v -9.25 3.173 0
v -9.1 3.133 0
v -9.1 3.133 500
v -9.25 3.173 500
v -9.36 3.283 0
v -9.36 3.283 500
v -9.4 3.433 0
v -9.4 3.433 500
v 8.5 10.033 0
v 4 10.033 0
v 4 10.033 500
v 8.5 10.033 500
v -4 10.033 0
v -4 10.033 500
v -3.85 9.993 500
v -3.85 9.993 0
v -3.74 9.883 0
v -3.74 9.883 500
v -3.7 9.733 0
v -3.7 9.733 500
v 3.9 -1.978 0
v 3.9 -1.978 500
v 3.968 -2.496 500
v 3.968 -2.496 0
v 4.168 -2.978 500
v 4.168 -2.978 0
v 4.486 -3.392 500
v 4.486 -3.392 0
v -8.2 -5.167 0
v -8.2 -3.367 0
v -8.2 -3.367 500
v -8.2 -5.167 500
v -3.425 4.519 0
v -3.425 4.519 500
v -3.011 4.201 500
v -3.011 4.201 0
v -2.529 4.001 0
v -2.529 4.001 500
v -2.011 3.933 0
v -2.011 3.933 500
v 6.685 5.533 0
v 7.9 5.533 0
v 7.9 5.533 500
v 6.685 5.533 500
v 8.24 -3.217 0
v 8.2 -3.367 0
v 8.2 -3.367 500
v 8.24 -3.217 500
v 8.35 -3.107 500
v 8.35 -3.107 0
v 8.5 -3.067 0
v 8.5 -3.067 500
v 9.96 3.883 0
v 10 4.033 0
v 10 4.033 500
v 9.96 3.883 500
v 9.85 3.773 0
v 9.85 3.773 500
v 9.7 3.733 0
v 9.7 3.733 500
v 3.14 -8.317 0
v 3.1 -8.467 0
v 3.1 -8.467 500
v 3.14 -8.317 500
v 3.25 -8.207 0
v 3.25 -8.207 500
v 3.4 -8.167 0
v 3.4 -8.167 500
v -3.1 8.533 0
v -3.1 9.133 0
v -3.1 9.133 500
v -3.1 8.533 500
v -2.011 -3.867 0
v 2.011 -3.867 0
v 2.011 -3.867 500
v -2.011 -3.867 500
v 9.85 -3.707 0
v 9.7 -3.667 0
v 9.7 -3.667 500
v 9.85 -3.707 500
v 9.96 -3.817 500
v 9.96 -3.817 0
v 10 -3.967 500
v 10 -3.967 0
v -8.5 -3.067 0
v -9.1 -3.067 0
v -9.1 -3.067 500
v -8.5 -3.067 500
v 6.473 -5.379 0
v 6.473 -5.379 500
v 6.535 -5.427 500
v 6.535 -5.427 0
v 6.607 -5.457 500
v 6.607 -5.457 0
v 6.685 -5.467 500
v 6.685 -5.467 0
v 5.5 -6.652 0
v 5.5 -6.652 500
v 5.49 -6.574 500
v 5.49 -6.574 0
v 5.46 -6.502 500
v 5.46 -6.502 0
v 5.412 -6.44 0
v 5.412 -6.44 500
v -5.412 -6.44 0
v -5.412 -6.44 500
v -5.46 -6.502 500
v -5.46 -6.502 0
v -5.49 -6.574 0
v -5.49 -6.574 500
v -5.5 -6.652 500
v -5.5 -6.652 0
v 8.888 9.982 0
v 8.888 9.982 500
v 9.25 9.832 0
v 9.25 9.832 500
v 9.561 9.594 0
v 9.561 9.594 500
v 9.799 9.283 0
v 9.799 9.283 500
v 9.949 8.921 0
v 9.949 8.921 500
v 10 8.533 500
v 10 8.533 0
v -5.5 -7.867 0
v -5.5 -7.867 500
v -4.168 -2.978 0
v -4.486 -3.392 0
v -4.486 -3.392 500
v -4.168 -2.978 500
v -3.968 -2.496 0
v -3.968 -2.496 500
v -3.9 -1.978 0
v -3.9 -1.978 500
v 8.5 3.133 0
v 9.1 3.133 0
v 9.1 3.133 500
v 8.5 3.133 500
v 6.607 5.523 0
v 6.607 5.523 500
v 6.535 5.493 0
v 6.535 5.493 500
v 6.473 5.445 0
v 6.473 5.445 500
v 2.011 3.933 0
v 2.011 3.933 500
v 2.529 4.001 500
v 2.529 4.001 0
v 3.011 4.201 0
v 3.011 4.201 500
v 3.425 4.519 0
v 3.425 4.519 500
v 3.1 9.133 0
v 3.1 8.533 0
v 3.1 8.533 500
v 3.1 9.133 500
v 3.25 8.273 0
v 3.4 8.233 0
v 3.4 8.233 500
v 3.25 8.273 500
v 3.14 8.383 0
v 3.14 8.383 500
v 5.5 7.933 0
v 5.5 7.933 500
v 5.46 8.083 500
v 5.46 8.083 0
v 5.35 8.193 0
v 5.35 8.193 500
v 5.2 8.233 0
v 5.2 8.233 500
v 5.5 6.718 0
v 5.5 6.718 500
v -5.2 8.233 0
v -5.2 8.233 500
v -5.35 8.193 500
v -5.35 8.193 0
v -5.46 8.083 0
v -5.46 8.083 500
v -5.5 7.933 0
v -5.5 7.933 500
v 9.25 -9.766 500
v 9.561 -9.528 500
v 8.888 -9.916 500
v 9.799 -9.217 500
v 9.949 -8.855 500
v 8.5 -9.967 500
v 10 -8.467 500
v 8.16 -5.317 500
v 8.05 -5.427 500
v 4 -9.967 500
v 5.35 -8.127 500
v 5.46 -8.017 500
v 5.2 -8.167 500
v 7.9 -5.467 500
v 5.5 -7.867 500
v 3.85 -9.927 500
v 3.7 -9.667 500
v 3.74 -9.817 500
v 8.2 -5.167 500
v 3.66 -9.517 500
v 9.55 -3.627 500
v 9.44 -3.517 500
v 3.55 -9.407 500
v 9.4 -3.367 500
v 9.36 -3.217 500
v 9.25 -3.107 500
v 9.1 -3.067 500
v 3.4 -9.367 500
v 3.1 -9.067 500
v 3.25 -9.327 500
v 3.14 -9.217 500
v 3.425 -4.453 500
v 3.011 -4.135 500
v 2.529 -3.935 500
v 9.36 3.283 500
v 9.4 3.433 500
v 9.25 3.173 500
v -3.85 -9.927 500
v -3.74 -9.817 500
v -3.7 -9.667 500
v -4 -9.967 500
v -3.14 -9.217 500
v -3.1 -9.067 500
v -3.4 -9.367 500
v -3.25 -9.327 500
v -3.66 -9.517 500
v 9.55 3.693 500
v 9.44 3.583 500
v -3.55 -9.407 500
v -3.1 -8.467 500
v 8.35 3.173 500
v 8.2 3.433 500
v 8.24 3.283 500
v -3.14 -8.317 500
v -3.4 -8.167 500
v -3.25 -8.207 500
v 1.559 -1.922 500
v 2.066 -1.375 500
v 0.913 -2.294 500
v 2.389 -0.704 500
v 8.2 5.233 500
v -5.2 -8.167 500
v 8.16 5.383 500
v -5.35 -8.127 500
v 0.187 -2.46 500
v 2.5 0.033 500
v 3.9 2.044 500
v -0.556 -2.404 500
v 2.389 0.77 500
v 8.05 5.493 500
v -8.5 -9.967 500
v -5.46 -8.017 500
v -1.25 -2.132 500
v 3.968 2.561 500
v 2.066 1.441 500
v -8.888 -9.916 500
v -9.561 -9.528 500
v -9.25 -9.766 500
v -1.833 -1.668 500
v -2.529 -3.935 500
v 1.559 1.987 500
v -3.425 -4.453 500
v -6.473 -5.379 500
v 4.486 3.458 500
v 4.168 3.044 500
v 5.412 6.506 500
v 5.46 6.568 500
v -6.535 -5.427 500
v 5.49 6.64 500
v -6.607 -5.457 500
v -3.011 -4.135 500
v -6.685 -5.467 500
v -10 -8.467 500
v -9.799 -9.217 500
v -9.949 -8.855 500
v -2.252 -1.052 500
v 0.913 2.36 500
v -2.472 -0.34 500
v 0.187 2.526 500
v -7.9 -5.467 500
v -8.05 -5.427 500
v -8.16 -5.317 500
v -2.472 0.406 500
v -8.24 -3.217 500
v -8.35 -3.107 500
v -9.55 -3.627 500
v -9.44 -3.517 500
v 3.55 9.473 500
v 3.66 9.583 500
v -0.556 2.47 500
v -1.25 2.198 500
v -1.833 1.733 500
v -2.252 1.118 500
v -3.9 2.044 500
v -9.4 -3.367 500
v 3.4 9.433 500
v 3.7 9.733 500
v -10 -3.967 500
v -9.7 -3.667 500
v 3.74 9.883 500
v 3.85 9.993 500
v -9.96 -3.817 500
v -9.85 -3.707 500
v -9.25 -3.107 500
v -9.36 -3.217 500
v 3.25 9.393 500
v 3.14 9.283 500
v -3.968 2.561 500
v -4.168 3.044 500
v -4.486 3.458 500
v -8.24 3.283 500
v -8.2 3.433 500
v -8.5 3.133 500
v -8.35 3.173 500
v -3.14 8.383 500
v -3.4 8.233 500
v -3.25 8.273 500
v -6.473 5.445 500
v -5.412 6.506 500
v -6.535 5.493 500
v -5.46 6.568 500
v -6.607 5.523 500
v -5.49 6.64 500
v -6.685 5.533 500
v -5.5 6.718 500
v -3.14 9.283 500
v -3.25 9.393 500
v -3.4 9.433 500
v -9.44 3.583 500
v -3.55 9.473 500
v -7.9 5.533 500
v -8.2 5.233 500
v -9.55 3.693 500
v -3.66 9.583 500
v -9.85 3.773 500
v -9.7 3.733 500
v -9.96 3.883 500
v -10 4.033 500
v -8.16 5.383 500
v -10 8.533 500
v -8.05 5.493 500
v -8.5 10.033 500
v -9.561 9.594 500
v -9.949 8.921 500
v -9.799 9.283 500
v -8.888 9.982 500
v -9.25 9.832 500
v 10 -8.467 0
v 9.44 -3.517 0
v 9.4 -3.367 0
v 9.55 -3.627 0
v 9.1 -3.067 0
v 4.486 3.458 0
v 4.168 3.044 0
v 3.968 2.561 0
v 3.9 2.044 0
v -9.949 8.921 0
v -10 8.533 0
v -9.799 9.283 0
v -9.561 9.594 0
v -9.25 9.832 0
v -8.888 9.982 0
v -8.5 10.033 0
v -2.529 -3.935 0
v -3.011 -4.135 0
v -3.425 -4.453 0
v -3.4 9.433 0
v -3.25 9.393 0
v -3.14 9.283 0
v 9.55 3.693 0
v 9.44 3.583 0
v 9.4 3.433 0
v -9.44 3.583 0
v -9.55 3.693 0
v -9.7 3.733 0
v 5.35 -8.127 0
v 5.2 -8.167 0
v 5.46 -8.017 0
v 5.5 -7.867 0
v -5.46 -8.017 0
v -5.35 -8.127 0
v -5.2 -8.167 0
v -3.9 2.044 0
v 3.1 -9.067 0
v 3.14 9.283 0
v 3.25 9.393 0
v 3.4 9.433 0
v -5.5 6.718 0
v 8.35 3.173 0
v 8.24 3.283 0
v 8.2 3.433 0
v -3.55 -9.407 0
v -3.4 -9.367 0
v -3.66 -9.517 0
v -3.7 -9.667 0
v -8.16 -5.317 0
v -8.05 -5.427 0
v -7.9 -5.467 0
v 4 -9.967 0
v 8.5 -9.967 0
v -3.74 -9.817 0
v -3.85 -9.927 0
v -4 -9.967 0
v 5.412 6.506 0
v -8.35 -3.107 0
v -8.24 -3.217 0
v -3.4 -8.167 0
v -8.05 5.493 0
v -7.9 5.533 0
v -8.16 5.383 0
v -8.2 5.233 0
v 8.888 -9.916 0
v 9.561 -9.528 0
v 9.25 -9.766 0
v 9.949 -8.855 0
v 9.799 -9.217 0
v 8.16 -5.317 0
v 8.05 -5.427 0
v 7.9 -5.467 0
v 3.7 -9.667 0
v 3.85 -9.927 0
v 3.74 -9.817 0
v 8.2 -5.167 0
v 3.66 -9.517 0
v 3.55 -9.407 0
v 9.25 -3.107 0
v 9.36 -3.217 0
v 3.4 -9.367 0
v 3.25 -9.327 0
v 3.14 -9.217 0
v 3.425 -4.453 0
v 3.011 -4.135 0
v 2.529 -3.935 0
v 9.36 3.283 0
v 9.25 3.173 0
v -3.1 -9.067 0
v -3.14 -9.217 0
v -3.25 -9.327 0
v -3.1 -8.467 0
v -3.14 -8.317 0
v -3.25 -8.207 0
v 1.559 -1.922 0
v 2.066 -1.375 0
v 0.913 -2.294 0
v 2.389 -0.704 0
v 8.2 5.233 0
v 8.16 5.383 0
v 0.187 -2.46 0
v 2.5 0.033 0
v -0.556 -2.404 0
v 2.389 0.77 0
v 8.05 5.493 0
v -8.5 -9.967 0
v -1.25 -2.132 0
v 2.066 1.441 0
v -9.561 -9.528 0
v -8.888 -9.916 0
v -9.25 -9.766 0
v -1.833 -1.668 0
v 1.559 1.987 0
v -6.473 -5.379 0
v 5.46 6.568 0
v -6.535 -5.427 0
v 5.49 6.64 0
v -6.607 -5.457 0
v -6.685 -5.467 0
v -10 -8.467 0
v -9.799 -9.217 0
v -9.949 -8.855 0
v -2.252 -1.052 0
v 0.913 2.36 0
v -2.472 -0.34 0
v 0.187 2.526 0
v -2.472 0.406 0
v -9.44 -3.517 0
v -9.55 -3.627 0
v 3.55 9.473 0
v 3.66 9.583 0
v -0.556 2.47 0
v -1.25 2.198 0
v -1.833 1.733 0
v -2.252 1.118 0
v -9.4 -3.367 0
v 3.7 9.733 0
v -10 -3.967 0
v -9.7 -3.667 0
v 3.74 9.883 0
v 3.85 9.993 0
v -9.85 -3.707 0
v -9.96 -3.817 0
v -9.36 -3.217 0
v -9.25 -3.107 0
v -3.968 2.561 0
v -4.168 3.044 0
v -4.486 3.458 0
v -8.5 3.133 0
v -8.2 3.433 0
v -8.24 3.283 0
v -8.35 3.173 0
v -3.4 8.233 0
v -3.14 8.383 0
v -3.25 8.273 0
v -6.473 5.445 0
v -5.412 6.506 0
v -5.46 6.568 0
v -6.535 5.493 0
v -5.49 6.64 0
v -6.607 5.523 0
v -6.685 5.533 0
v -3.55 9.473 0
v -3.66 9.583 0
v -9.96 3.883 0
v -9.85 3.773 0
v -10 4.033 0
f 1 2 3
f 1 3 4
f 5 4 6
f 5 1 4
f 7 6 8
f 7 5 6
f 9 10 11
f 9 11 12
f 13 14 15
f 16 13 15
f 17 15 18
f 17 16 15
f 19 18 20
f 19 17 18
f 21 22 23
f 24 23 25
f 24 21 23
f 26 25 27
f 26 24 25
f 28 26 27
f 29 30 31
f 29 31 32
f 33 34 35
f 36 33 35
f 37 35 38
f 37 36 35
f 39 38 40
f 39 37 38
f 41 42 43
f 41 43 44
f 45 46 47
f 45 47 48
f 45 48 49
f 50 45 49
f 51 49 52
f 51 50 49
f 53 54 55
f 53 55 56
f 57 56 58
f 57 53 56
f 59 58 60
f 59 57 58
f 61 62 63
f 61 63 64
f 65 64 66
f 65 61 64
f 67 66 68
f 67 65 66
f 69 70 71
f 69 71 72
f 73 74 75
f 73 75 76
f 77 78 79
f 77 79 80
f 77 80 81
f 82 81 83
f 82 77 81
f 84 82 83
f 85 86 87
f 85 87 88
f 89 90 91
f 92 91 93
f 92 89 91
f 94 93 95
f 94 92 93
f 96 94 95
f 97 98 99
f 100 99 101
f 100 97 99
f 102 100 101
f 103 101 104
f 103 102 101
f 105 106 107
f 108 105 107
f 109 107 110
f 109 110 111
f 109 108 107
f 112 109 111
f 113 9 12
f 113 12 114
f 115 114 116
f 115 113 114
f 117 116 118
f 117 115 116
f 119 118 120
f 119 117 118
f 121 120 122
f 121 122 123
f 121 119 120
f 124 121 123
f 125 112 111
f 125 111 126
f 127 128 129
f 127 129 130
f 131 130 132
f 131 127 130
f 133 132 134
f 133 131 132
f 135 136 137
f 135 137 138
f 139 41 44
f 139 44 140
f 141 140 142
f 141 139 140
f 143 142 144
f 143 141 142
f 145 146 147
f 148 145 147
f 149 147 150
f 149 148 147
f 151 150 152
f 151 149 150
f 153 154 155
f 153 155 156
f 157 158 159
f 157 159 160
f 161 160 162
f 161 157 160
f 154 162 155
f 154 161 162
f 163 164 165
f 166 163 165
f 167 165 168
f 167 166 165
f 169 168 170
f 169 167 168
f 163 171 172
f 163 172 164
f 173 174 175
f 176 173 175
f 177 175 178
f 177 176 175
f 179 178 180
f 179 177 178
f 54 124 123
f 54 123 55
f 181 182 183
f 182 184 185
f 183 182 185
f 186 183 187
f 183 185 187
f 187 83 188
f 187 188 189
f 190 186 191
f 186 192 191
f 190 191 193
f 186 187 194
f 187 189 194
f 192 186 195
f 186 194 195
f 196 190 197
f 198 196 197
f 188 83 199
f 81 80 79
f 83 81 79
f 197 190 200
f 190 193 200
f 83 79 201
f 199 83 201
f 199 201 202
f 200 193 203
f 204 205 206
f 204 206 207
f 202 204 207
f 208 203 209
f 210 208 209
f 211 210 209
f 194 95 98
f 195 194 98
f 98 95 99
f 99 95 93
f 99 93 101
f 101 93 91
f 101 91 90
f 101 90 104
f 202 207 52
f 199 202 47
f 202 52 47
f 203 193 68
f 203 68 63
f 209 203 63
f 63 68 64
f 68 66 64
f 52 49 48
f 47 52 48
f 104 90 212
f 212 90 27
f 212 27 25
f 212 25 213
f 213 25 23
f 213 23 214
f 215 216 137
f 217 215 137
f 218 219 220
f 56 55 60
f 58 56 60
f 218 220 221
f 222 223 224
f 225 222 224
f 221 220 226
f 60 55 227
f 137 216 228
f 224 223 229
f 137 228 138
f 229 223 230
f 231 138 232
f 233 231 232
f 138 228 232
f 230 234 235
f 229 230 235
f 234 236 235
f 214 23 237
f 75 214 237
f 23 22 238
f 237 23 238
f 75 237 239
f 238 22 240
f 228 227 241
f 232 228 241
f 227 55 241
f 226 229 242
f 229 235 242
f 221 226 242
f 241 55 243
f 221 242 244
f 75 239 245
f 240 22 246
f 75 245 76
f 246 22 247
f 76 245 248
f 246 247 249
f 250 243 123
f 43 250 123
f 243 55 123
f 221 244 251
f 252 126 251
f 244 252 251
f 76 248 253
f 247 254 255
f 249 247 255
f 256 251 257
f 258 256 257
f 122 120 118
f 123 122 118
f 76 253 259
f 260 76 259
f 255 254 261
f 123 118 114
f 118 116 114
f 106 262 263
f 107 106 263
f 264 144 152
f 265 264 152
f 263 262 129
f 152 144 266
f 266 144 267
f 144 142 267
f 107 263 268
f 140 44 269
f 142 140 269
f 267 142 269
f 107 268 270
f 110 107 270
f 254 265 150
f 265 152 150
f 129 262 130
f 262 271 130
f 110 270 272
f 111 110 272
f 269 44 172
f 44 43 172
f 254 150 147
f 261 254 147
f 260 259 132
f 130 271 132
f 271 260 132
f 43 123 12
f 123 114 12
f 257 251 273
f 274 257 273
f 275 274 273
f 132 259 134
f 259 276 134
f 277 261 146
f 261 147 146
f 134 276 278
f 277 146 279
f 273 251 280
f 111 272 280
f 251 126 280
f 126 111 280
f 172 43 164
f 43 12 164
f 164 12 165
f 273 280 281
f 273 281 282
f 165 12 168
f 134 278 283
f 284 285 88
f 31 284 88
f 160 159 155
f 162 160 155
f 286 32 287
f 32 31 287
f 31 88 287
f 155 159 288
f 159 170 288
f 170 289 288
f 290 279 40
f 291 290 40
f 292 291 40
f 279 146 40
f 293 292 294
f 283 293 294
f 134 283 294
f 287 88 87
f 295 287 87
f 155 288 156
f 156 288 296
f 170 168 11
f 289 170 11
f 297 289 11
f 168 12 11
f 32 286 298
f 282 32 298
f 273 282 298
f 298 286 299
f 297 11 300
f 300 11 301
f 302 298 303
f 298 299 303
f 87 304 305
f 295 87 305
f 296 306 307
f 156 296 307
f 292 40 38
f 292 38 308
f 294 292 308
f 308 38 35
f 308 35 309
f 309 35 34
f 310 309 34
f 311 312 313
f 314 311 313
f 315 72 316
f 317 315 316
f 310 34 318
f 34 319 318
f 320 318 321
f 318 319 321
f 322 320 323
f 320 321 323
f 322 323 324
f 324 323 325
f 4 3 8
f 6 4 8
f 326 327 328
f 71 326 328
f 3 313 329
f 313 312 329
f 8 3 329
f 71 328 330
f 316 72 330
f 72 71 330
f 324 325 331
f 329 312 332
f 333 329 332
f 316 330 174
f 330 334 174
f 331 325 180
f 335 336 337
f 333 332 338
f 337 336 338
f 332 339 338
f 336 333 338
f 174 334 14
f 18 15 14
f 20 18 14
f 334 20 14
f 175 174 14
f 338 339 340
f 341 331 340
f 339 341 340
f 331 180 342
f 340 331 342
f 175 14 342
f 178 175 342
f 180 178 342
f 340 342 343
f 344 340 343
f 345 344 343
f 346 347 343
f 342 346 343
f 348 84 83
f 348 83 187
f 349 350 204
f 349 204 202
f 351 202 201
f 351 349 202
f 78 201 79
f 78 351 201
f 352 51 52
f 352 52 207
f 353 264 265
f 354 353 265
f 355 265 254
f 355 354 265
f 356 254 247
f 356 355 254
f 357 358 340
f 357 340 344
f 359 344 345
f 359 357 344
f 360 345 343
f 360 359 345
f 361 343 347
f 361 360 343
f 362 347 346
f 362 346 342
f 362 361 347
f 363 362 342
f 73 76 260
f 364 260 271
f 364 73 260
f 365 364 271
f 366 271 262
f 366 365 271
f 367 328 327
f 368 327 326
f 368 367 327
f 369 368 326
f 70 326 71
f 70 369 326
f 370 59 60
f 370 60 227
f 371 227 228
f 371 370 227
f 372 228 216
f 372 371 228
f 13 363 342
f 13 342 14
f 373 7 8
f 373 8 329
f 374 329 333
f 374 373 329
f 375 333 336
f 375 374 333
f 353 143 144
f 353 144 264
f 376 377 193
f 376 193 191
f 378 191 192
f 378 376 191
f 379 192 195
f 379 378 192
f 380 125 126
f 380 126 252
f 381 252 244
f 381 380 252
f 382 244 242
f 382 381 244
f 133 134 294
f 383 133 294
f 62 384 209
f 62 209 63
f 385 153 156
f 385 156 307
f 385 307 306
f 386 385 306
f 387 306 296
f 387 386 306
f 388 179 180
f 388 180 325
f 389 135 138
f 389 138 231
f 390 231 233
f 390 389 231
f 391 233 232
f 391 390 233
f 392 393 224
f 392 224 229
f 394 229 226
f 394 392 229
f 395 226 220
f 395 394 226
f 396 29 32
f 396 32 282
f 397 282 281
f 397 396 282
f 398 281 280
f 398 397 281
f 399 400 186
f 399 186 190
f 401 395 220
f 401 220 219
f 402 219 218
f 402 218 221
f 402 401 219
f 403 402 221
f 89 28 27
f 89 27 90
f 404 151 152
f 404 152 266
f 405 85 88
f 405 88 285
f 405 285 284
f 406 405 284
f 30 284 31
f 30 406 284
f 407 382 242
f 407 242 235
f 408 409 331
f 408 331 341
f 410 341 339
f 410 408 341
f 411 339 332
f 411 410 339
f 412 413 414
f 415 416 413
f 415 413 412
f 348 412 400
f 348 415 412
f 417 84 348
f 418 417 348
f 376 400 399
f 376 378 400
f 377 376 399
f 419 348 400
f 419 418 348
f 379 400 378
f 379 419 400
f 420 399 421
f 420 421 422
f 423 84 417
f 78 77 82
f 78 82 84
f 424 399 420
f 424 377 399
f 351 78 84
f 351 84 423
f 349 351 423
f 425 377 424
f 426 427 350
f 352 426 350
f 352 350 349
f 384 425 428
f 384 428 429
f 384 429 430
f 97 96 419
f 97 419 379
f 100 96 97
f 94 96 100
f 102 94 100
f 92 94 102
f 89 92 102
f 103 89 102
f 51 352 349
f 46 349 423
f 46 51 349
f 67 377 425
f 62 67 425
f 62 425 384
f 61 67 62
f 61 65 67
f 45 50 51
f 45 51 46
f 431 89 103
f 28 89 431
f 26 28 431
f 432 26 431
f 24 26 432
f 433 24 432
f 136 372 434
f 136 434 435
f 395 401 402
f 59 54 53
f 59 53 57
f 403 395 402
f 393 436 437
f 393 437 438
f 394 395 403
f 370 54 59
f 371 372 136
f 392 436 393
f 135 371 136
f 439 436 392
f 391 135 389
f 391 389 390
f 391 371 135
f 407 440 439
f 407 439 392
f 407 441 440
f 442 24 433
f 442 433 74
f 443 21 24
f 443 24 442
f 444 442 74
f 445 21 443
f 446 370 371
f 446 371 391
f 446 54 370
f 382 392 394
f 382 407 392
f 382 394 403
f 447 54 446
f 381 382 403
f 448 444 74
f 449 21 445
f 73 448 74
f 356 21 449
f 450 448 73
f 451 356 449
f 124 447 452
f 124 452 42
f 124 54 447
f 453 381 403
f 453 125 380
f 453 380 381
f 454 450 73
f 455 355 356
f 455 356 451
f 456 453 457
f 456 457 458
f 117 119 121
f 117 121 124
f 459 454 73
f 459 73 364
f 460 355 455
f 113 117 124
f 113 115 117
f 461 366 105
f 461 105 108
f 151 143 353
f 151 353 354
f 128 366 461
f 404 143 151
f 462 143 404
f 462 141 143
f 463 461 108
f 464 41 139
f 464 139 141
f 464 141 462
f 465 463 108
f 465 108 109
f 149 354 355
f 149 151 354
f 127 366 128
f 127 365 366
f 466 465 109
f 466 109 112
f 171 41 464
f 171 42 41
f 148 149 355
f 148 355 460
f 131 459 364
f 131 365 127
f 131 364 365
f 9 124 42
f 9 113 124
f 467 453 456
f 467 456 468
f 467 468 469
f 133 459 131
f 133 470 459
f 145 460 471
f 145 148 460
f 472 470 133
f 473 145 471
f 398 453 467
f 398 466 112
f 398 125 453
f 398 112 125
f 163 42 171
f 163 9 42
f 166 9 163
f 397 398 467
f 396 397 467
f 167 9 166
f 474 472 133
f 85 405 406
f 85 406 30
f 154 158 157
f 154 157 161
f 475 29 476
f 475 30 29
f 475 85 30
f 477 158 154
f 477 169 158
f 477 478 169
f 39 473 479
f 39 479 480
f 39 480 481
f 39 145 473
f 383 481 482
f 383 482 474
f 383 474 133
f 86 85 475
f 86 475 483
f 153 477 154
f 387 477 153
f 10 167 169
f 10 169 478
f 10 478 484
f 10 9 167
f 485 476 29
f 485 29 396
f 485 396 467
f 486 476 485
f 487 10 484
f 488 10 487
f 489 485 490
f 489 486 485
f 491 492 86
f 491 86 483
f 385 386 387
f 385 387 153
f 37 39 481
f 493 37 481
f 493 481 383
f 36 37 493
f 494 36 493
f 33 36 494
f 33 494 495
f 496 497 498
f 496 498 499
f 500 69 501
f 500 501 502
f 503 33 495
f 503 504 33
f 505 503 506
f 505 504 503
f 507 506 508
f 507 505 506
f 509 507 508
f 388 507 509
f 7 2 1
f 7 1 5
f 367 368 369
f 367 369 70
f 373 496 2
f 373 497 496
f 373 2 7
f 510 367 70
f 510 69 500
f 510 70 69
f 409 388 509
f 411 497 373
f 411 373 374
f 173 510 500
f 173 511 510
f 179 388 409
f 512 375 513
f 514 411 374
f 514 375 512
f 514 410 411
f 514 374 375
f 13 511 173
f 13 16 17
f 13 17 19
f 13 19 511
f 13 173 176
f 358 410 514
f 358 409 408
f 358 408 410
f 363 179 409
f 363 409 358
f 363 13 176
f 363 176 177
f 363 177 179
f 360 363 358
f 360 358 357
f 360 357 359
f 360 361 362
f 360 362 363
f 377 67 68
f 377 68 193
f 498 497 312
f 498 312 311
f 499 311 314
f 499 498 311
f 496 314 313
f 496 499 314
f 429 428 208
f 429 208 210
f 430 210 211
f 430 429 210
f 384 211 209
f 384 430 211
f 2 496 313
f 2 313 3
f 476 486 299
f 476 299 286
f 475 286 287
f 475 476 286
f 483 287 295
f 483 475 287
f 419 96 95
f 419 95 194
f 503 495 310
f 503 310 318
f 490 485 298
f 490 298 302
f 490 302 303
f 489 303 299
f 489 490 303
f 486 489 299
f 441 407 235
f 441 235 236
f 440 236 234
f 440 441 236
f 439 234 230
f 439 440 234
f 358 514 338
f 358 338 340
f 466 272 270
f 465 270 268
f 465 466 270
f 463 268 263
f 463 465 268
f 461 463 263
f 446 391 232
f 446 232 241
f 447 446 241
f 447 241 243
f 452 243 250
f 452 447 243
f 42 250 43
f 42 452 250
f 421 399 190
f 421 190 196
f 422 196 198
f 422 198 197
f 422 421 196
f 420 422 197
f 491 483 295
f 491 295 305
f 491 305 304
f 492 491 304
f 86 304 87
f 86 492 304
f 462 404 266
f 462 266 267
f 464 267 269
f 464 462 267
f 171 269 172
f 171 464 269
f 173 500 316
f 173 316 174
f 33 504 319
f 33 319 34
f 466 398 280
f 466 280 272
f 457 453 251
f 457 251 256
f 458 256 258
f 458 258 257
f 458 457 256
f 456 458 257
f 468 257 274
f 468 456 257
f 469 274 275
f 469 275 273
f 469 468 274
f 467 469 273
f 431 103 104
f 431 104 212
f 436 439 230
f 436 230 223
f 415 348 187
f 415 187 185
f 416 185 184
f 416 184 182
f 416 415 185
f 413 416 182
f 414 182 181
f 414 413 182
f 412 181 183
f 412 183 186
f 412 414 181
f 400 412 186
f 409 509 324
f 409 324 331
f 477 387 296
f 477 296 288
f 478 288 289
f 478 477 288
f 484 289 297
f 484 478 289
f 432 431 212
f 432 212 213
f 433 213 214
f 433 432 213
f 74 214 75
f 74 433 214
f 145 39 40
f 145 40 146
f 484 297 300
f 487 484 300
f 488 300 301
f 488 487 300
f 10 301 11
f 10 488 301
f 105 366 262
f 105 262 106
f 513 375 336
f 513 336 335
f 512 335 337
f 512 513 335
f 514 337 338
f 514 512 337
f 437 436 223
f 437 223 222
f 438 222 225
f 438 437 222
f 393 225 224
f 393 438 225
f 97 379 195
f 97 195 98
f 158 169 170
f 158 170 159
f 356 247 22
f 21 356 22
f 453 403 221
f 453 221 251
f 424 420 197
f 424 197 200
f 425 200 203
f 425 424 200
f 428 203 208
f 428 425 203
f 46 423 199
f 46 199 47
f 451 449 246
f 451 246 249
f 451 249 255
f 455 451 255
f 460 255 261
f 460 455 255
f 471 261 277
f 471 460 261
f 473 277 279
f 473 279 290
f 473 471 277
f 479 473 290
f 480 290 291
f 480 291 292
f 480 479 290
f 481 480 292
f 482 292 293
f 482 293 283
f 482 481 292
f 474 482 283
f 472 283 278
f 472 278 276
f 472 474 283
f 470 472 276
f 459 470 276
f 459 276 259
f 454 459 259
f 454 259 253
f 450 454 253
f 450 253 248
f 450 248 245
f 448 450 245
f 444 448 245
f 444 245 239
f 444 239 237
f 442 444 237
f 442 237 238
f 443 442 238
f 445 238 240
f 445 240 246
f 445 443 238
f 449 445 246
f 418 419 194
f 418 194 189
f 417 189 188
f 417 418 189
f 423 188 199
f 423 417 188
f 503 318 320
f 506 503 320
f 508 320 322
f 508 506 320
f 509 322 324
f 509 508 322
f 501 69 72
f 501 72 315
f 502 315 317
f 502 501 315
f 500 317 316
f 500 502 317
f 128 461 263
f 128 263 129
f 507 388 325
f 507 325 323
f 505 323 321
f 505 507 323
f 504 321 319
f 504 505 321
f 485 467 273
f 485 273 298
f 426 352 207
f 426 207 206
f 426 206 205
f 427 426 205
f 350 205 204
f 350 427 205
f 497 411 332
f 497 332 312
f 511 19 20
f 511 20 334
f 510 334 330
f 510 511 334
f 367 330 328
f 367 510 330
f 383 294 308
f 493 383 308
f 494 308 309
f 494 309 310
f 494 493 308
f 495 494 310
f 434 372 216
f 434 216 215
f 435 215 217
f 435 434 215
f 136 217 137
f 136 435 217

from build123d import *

# Parameters (mm, degrees)
SKETCH_1_R      = 2.5
EXTRUDE_1_DEPTH = 500


with BuildPart() as part:
    # 草图1 → 凸台-拉伸1 (new body)
    with BuildSketch(Plane.XY):
        with BuildLine():
            Line((10, 8.532915167), (10, 4.032915167))
            ThreePointArc((10, 4.032915167), (9.912132034, 3.820783133), (9.7, 3.732915167))
            ThreePointArc((9.7, 3.732915167), (9.487867966, 3.645047202), (9.4, 3.432915167))
            ThreePointArc((9.4, 3.432915167), (9.312132034, 3.220783133), (9.1, 3.132915167))
            Line((9.1, 3.132915167), (8.5, 3.132915167))
            ThreePointArc((8.5, 3.132915167), (8.287867966, 3.220783133), (8.2, 3.432915167))
            Line((8.2, 3.432915167), (8.2, 5.232915167))
            ThreePointArc((8.2, 5.232915167), (8.112132034, 5.445047202), (7.9, 5.532915167))
            Line((7.9, 5.532915167), (6.68492424, 5.532915167))
            ThreePointArc((6.68492424, 5.532915167), (6.570119211, 5.510079027), (6.472792206, 5.445047202))
            Line((6.472792206, 5.445047202), (4.485786438, 3.458041433))
            ThreePointArc((4.485786438, 3.458041433), (4.052240935, 2.809194736), (3.9, 2.043827871))
            Line((3.9, 2.043827871), (3.9, -1.977997536))
            ThreePointArc((3.9, -1.977997536), (4.052240935, -2.743364401), (4.485786438, -3.392211098))
            Line((4.485786438, -3.392211098), (6.472792206, -5.379216867))
            ThreePointArc((6.472792206, -5.379216867), (6.570119211, -5.444248692), (6.68492424, -5.467084833))
            Line((6.68492424, -5.467084833), (7.9, -5.467084833))
            ThreePointArc((7.9, -5.467084833), (8.112132034, -5.379216867), (8.2, -5.167084833))
            Line((8.2, -5.167084833), (8.2, -3.367084833))
            ThreePointArc((8.2, -3.367084833), (8.287867966, -3.154952798), (8.5, -3.067084833))
            Line((8.5, -3.067084833), (9.1, -3.067084833))
            ThreePointArc((9.1, -3.067084833), (9.312132034, -3.154952798), (9.4, -3.367084833))
            ThreePointArc((9.4, -3.367084833), (9.487867966, -3.579216867), (9.7, -3.667084833))
            ThreePointArc((9.7, -3.667084833), (9.912132034, -3.754952798), (10, -3.967084833))
            Line((10, -3.967084833), (10, -8.467084833))
            ThreePointArc((10, -8.467084833), (9.560660172, -9.527745004), (8.5, -9.967084833))
            Line((8.5, -9.967084833), (4, -9.967084833))
            ThreePointArc((4, -9.967084833), (3.787867966, -9.879216867), (3.7, -9.667084833))
            ThreePointArc((3.7, -9.667084833), (3.612132034, -9.454952798), (3.4, -9.367084833))
            ThreePointArc((3.4, -9.367084833), (3.187867966, -9.279216867), (3.1, -9.067084833))
            Line((3.1, -9.067084833), (3.1, -8.467084833))
            ThreePointArc((3.1, -8.467084833), (3.187867966, -8.254952798), (3.4, -8.167084833))
            Line((3.4, -8.167084833), (5.2, -8.167084833))
            ThreePointArc((5.2, -8.167084833), (5.412132034, -8.079216867), (5.5, -7.867084833))
            Line((5.5, -7.867084833), (5.5, -6.652009073))
            ThreePointArc((5.5, -6.652009073), (5.47716386, -6.537204043), (5.412132034, -6.439877039))
            Line((5.412132034, -6.439877039), (3.425126266, -4.45287127))
            ThreePointArc((3.425126266, -4.45287127), (2.776279568, -4.019325767), (2.010912703, -3.867084833))
            Line((2.010912703, -3.867084833), (-2.010912703, -3.867084833))
            ThreePointArc((-2.010912703, -3.867084833), (-2.776279568, -4.019325767), (-3.425126266, -4.45287127))
            Line((-3.425126266, -4.45287127), (-5.412132034, -6.439877039))
            ThreePointArc((-5.412132034, -6.439877039), (-5.47716386, -6.537204043), (-5.5, -6.652009073))
            Line((-5.5, -6.652009073), (-5.5, -7.867084833))
            ThreePointArc((-5.5, -7.867084833), (-5.412132034, -8.079216867), (-5.2, -8.167084833))
            Line((-5.2, -8.167084833), (-3.4, -8.167084833))
            ThreePointArc((-3.4, -8.167084833), (-3.187867966, -8.254952798), (-3.1, -8.467084833))
            Line((-3.1, -8.467084833), (-3.1, -9.067084833))
            ThreePointArc((-3.1, -9.067084833), (-3.187867966, -9.279216867), (-3.4, -9.367084833))
            ThreePointArc((-3.4, -9.367084833), (-3.612132034, -9.454952798), (-3.7, -9.667084833))
            ThreePointArc((-3.7, -9.667084833), (-3.787867966, -9.879216867), (-4, -9.967084833))
            Line((-4, -9.967084833), (-8.5, -9.967084833))
            ThreePointArc((-8.5, -9.967084833), (-9.560660172, -9.527745004), (-10, -8.467084833))
            Line((-10, -8.467084833), (-10, -3.967084833))
            ThreePointArc((-10, -3.967084833), (-9.912132034, -3.754952798), (-9.7, -3.667084833))
            ThreePointArc((-9.7, -3.667084833), (-9.487867966, -3.579216867), (-9.4, -3.367084833))
            ThreePointArc((-9.4, -3.367084833), (-9.312132034, -3.154952798), (-9.1, -3.067084833))
            Line((-9.1, -3.067084833), (-8.5, -3.067084833))
            ThreePointArc((-8.5, -3.067084833), (-8.287867966, -3.154952798), (-8.2, -3.367084833))
            Line((-8.2, -3.367084833), (-8.2, -5.167084833))
            ThreePointArc((-8.2, -5.167084833), (-8.112132034, -5.379216867), (-7.9, -5.467084833))
            Line((-7.9, -5.467084833), (-6.68492424, -5.467084833))
            ThreePointArc((-6.68492424, -5.467084833), (-6.570119211, -5.444248692), (-6.472792206, -5.379216867))
            Line((-6.472792206, -5.379216867), (-4.485786438, -3.392211098))
            ThreePointArc((-4.485786438, -3.392211098), (-4.052240935, -2.743364401), (-3.9, -1.977997536))
            Line((-3.9, -1.977997536), (-3.9, 2.043827871))
            ThreePointArc((-3.9, 2.043827871), (-4.052240935, 2.809194736), (-4.485786438, 3.458041433))
            Line((-4.485786438, 3.458041433), (-6.472792206, 5.445047202))
            ThreePointArc((-6.472792206, 5.445047202), (-6.570119211, 5.510079027), (-6.68492424, 5.532915167))
            Line((-6.68492424, 5.532915167), (-7.9, 5.532915167))
            ThreePointArc((-7.9, 5.532915167), (-8.112132034, 5.445047202), (-8.2, 5.232915167))
            Line((-8.2, 5.232915167), (-8.2, 3.432915167))
            ThreePointArc((-8.2, 3.432915167), (-8.287867966, 3.220783133), (-8.5, 3.132915167))
            Line((-8.5, 3.132915167), (-9.1, 3.132915167))
            ThreePointArc((-9.1, 3.132915167), (-9.312132034, 3.220783133), (-9.4, 3.432915167))
            ThreePointArc((-9.4, 3.432915167), (-9.487867966, 3.645047202), (-9.7, 3.732915167))
            ThreePointArc((-9.7, 3.732915167), (-9.912132034, 3.820783133), (-10, 4.032915167))
            Line((-10, 4.032915167), (-10, 8.532915167))
            ThreePointArc((-10, 8.532915167), (-9.560660172, 9.593575339), (-8.5, 10.032915167))
            Line((-8.5, 10.032915167), (-4, 10.032915167))
            ThreePointArc((-4, 10.032915167), (-3.787867966, 9.945047202), (-3.7, 9.732915167))
            ThreePointArc((-3.7, 9.732915167), (-3.612132034, 9.520783133), (-3.4, 9.432915167))
            ThreePointArc((-3.4, 9.432915167), (-3.187867966, 9.345047202), (-3.1, 9.132915167))
            Line((-3.1, 9.132915167), (-3.1, 8.532915167))
            ThreePointArc((-3.1, 8.532915167), (-3.187867966, 8.320783133), (-3.4, 8.232915167))
            Line((-3.4, 8.232915167), (-5.2, 8.232915167))
            ThreePointArc((-5.2, 8.232915167), (-5.412132034, 8.145047202), (-5.5, 7.932915167))
            Line((-5.5, 7.932915167), (-5.5, 6.717839408))
            ThreePointArc((-5.5, 6.717839408), (-5.47716386, 6.603034378), (-5.412132034, 6.505707374))
            Line((-5.412132034, 6.505707374), (-3.425126266, 4.518701605))
            ThreePointArc((-3.425126266, 4.518701605), (-2.776279568, 4.085156102), (-2.010912703, 3.932915167))
            Line((-2.010912703, 3.932915167), (2.010912703, 3.932915167))
            ThreePointArc((2.010912703, 3.932915167), (2.776279568, 4.085156102), (3.425126266, 4.518701605))
            Line((3.425126266, 4.518701605), (5.412132034, 6.505707374))
            ThreePointArc((5.412132034, 6.505707374), (5.47716386, 6.603034378), (5.5, 6.717839408))
            Line((5.5, 6.717839408), (5.5, 7.932915167))
            ThreePointArc((5.5, 7.932915167), (5.412132034, 8.145047202), (5.2, 8.232915167))
            Line((5.2, 8.232915167), (3.4, 8.232915167))
            ThreePointArc((3.4, 8.232915167), (3.187867966, 8.320783133), (3.1, 8.532915167))
            Line((3.1, 8.532915167), (3.1, 9.132915167))
            ThreePointArc((3.1, 9.132915167), (3.187867966, 9.345047202), (3.4, 9.432915167))
            ThreePointArc((3.4, 9.432915167), (3.612132034, 9.520783133), (3.7, 9.732915167))
            ThreePointArc((3.7, 9.732915167), (3.787867966, 9.945047202), (4, 10.032915167))
            Line((4, 10.032915167), (8.5, 10.032915167))
            ThreePointArc((8.5, 10.032915167), (9.560660172, 9.593575339), (10, 8.532915167))
        make_face()
        with Locations((0, 0.032915167)):
            Circle(SKETCH_1_R, mode=Mode.SUBTRACT)
    extrude(amount=EXTRUDE_1_DEPTH)


solid = part.part
